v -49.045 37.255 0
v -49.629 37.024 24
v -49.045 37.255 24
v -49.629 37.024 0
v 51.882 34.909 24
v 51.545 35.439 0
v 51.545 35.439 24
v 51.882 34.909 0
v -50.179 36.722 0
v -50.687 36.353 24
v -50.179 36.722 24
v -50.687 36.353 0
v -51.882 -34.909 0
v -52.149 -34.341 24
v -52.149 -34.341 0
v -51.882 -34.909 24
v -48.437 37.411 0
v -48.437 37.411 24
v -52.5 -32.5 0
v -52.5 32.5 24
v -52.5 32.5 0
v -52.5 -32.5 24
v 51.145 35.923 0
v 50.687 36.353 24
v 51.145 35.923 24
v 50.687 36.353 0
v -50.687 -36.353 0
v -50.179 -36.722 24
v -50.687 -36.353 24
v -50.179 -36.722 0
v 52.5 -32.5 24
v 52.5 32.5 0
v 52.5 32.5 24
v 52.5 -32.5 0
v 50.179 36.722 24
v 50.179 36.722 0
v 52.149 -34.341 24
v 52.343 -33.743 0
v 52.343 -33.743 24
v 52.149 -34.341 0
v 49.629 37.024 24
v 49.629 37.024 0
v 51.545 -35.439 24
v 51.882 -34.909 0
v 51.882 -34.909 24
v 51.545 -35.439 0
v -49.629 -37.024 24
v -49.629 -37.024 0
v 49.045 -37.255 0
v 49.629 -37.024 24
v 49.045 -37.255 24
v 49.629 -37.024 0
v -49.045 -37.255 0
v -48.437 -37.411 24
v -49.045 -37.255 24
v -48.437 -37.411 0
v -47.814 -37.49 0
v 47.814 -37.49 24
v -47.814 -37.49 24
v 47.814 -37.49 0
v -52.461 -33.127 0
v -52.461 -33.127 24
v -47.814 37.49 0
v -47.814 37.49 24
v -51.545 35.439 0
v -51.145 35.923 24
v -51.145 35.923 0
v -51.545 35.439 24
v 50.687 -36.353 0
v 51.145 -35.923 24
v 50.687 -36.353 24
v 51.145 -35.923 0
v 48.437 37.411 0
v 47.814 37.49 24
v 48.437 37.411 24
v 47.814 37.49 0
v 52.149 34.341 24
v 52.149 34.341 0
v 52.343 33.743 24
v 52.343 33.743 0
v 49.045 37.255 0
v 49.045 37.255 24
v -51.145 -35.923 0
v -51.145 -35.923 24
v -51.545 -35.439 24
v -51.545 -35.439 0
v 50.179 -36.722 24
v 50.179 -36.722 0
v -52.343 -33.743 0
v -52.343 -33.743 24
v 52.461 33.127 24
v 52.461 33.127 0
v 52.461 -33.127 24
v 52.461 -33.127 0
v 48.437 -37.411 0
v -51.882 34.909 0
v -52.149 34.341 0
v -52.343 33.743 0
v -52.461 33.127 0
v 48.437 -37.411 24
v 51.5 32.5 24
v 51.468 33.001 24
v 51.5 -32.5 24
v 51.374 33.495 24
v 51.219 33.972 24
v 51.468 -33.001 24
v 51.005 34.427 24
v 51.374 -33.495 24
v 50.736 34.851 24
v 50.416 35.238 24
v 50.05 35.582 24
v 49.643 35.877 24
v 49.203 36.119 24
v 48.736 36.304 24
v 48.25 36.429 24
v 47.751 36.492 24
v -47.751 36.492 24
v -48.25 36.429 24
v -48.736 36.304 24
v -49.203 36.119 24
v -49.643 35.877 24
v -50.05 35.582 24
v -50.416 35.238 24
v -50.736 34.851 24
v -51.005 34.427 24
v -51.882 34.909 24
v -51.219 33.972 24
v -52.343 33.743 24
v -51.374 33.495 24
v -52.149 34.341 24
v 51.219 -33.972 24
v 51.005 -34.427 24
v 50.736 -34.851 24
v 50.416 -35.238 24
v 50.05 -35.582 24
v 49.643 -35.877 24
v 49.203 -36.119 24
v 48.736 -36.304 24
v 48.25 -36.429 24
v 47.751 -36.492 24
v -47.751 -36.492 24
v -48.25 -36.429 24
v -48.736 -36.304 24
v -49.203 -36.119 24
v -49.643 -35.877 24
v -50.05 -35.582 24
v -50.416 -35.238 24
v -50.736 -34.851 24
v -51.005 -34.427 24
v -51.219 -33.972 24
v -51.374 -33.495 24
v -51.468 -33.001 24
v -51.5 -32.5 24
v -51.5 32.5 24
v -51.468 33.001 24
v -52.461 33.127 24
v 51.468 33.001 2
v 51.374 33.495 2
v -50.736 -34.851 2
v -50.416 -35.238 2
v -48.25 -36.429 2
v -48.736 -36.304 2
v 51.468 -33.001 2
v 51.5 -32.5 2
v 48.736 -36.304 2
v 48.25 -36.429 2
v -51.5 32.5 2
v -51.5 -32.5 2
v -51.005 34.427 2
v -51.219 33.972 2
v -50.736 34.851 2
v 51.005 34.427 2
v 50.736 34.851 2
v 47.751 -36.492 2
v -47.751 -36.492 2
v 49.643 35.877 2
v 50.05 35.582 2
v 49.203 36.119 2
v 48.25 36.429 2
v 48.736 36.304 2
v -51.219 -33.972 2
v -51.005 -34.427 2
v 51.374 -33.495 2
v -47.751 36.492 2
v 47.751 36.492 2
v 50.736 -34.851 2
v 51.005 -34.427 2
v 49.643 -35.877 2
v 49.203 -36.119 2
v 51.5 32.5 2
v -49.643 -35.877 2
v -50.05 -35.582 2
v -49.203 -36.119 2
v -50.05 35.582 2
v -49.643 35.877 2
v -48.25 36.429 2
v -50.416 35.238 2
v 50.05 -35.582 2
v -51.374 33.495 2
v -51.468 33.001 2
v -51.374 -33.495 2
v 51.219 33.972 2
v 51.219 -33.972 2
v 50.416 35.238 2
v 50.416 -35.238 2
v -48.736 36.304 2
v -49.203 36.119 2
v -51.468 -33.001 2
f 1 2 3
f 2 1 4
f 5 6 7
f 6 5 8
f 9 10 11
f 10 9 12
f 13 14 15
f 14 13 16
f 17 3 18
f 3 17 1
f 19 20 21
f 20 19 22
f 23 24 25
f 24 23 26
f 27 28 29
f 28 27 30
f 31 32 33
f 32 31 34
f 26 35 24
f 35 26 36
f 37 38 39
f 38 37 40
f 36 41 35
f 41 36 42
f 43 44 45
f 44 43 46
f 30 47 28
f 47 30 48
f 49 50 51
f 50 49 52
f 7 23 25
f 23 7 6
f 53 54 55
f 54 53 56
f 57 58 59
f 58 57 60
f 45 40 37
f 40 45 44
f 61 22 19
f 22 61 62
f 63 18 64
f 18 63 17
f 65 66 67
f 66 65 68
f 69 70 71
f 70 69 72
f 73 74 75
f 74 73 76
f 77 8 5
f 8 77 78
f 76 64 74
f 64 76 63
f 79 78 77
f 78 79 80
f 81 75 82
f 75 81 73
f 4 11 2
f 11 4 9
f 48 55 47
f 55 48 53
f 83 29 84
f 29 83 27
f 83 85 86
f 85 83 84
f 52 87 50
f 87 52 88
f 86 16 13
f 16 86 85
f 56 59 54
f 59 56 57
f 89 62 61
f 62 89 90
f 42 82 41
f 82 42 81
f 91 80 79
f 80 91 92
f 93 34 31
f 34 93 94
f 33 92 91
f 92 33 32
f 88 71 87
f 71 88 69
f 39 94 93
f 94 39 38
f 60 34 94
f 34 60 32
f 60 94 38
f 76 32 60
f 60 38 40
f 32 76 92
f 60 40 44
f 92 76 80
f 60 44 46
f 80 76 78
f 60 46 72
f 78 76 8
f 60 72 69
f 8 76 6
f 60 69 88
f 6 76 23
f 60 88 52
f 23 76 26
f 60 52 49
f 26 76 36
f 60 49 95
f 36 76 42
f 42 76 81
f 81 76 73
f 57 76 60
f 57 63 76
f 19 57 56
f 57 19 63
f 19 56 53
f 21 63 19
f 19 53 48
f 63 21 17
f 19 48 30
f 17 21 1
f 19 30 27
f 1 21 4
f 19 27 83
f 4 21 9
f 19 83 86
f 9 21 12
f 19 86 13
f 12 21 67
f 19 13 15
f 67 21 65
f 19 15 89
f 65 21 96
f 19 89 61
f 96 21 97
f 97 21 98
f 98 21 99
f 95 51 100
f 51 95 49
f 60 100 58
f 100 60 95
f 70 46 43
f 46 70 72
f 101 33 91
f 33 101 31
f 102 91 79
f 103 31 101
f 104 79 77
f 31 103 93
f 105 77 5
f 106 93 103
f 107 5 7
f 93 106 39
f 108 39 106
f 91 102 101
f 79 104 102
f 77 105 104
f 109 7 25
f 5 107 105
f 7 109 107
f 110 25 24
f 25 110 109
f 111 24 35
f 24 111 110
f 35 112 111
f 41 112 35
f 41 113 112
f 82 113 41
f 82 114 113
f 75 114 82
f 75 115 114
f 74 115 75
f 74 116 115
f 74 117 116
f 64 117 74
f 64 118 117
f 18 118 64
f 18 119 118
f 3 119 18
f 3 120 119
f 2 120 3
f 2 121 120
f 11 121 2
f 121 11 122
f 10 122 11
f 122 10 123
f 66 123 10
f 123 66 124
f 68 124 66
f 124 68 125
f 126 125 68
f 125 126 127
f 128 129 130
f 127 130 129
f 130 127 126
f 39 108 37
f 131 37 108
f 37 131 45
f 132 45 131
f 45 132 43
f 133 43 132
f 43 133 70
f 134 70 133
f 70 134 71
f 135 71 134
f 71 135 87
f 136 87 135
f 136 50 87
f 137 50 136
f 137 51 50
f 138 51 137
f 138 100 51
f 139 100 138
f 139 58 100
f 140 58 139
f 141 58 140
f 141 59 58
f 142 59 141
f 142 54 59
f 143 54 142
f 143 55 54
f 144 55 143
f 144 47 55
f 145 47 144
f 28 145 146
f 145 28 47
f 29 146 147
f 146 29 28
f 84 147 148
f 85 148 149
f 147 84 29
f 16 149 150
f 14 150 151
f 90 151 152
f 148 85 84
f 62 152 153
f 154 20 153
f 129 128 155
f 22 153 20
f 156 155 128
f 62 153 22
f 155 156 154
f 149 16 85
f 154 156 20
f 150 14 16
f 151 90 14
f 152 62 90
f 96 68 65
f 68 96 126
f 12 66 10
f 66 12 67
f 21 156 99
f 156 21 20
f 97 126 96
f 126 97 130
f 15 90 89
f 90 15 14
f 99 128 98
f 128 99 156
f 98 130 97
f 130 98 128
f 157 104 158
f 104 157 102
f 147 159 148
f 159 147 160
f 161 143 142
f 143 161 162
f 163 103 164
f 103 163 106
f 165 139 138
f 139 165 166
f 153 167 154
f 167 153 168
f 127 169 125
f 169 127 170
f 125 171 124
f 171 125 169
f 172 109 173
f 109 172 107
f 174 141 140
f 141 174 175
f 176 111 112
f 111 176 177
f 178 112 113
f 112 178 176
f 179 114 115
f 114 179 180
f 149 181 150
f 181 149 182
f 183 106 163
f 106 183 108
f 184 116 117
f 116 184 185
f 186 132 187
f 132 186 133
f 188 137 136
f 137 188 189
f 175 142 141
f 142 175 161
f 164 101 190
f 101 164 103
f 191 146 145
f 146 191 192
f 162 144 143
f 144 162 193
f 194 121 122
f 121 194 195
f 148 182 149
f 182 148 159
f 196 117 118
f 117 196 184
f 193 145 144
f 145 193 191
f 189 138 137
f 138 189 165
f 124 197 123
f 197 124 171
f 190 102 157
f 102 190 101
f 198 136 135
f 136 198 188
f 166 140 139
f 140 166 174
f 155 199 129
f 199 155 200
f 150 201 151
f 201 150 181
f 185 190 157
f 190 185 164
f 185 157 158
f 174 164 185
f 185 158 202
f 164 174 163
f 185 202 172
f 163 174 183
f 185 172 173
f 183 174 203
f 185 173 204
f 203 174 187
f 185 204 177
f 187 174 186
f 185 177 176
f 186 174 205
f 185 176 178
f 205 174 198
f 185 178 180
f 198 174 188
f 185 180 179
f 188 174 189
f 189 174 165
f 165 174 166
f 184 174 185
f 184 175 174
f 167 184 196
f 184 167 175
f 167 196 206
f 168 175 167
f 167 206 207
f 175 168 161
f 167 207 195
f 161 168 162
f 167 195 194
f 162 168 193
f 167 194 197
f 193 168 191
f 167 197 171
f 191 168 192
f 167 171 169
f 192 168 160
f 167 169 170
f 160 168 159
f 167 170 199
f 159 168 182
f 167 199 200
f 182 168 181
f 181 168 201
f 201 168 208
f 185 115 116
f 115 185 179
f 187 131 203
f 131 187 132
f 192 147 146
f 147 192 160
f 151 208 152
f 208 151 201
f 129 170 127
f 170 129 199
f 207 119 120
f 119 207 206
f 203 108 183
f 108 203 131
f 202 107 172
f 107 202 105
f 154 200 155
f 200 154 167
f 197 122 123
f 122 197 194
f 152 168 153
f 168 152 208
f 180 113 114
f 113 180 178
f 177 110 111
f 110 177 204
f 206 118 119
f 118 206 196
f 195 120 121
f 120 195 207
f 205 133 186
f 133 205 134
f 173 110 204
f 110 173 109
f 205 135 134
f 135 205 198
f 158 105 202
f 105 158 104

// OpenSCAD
$fn = 50;


difference() {
	union() {
		hull() {
			translate(v = [-47.5000000000, 32.5000000000, 0]) {
				cylinder(h = 24, r = 5);
			}
			translate(v = [47.5000000000, 32.5000000000, 0]) {
				cylinder(h = 24, r = 5);
			}
			translate(v = [-47.5000000000, -32.5000000000, 0]) {
				cylinder(h = 24, r = 5);
			}
			translate(v = [47.5000000000, -32.5000000000, 0]) {
				cylinder(h = 24, r = 5);
			}
		}
	}
	union() {
		translate(v = [0, 0, 2]) {
			hull() {
				translate(v = [-47.5000000000, 32.5000000000, 0]) {
					cylinder(h = 22, r = 4);
				}
				translate(v = [47.5000000000, 32.5000000000, 0]) {
					cylinder(h = 22, r = 4);
				}
				translate(v = [-47.5000000000, -32.5000000000, 0]) {
					cylinder(h = 22, r = 4);
				}
				translate(v = [47.5000000000, -32.5000000000, 0]) {
					cylinder(h = 22, r = 4);
				}
			}
		}
	}
}
